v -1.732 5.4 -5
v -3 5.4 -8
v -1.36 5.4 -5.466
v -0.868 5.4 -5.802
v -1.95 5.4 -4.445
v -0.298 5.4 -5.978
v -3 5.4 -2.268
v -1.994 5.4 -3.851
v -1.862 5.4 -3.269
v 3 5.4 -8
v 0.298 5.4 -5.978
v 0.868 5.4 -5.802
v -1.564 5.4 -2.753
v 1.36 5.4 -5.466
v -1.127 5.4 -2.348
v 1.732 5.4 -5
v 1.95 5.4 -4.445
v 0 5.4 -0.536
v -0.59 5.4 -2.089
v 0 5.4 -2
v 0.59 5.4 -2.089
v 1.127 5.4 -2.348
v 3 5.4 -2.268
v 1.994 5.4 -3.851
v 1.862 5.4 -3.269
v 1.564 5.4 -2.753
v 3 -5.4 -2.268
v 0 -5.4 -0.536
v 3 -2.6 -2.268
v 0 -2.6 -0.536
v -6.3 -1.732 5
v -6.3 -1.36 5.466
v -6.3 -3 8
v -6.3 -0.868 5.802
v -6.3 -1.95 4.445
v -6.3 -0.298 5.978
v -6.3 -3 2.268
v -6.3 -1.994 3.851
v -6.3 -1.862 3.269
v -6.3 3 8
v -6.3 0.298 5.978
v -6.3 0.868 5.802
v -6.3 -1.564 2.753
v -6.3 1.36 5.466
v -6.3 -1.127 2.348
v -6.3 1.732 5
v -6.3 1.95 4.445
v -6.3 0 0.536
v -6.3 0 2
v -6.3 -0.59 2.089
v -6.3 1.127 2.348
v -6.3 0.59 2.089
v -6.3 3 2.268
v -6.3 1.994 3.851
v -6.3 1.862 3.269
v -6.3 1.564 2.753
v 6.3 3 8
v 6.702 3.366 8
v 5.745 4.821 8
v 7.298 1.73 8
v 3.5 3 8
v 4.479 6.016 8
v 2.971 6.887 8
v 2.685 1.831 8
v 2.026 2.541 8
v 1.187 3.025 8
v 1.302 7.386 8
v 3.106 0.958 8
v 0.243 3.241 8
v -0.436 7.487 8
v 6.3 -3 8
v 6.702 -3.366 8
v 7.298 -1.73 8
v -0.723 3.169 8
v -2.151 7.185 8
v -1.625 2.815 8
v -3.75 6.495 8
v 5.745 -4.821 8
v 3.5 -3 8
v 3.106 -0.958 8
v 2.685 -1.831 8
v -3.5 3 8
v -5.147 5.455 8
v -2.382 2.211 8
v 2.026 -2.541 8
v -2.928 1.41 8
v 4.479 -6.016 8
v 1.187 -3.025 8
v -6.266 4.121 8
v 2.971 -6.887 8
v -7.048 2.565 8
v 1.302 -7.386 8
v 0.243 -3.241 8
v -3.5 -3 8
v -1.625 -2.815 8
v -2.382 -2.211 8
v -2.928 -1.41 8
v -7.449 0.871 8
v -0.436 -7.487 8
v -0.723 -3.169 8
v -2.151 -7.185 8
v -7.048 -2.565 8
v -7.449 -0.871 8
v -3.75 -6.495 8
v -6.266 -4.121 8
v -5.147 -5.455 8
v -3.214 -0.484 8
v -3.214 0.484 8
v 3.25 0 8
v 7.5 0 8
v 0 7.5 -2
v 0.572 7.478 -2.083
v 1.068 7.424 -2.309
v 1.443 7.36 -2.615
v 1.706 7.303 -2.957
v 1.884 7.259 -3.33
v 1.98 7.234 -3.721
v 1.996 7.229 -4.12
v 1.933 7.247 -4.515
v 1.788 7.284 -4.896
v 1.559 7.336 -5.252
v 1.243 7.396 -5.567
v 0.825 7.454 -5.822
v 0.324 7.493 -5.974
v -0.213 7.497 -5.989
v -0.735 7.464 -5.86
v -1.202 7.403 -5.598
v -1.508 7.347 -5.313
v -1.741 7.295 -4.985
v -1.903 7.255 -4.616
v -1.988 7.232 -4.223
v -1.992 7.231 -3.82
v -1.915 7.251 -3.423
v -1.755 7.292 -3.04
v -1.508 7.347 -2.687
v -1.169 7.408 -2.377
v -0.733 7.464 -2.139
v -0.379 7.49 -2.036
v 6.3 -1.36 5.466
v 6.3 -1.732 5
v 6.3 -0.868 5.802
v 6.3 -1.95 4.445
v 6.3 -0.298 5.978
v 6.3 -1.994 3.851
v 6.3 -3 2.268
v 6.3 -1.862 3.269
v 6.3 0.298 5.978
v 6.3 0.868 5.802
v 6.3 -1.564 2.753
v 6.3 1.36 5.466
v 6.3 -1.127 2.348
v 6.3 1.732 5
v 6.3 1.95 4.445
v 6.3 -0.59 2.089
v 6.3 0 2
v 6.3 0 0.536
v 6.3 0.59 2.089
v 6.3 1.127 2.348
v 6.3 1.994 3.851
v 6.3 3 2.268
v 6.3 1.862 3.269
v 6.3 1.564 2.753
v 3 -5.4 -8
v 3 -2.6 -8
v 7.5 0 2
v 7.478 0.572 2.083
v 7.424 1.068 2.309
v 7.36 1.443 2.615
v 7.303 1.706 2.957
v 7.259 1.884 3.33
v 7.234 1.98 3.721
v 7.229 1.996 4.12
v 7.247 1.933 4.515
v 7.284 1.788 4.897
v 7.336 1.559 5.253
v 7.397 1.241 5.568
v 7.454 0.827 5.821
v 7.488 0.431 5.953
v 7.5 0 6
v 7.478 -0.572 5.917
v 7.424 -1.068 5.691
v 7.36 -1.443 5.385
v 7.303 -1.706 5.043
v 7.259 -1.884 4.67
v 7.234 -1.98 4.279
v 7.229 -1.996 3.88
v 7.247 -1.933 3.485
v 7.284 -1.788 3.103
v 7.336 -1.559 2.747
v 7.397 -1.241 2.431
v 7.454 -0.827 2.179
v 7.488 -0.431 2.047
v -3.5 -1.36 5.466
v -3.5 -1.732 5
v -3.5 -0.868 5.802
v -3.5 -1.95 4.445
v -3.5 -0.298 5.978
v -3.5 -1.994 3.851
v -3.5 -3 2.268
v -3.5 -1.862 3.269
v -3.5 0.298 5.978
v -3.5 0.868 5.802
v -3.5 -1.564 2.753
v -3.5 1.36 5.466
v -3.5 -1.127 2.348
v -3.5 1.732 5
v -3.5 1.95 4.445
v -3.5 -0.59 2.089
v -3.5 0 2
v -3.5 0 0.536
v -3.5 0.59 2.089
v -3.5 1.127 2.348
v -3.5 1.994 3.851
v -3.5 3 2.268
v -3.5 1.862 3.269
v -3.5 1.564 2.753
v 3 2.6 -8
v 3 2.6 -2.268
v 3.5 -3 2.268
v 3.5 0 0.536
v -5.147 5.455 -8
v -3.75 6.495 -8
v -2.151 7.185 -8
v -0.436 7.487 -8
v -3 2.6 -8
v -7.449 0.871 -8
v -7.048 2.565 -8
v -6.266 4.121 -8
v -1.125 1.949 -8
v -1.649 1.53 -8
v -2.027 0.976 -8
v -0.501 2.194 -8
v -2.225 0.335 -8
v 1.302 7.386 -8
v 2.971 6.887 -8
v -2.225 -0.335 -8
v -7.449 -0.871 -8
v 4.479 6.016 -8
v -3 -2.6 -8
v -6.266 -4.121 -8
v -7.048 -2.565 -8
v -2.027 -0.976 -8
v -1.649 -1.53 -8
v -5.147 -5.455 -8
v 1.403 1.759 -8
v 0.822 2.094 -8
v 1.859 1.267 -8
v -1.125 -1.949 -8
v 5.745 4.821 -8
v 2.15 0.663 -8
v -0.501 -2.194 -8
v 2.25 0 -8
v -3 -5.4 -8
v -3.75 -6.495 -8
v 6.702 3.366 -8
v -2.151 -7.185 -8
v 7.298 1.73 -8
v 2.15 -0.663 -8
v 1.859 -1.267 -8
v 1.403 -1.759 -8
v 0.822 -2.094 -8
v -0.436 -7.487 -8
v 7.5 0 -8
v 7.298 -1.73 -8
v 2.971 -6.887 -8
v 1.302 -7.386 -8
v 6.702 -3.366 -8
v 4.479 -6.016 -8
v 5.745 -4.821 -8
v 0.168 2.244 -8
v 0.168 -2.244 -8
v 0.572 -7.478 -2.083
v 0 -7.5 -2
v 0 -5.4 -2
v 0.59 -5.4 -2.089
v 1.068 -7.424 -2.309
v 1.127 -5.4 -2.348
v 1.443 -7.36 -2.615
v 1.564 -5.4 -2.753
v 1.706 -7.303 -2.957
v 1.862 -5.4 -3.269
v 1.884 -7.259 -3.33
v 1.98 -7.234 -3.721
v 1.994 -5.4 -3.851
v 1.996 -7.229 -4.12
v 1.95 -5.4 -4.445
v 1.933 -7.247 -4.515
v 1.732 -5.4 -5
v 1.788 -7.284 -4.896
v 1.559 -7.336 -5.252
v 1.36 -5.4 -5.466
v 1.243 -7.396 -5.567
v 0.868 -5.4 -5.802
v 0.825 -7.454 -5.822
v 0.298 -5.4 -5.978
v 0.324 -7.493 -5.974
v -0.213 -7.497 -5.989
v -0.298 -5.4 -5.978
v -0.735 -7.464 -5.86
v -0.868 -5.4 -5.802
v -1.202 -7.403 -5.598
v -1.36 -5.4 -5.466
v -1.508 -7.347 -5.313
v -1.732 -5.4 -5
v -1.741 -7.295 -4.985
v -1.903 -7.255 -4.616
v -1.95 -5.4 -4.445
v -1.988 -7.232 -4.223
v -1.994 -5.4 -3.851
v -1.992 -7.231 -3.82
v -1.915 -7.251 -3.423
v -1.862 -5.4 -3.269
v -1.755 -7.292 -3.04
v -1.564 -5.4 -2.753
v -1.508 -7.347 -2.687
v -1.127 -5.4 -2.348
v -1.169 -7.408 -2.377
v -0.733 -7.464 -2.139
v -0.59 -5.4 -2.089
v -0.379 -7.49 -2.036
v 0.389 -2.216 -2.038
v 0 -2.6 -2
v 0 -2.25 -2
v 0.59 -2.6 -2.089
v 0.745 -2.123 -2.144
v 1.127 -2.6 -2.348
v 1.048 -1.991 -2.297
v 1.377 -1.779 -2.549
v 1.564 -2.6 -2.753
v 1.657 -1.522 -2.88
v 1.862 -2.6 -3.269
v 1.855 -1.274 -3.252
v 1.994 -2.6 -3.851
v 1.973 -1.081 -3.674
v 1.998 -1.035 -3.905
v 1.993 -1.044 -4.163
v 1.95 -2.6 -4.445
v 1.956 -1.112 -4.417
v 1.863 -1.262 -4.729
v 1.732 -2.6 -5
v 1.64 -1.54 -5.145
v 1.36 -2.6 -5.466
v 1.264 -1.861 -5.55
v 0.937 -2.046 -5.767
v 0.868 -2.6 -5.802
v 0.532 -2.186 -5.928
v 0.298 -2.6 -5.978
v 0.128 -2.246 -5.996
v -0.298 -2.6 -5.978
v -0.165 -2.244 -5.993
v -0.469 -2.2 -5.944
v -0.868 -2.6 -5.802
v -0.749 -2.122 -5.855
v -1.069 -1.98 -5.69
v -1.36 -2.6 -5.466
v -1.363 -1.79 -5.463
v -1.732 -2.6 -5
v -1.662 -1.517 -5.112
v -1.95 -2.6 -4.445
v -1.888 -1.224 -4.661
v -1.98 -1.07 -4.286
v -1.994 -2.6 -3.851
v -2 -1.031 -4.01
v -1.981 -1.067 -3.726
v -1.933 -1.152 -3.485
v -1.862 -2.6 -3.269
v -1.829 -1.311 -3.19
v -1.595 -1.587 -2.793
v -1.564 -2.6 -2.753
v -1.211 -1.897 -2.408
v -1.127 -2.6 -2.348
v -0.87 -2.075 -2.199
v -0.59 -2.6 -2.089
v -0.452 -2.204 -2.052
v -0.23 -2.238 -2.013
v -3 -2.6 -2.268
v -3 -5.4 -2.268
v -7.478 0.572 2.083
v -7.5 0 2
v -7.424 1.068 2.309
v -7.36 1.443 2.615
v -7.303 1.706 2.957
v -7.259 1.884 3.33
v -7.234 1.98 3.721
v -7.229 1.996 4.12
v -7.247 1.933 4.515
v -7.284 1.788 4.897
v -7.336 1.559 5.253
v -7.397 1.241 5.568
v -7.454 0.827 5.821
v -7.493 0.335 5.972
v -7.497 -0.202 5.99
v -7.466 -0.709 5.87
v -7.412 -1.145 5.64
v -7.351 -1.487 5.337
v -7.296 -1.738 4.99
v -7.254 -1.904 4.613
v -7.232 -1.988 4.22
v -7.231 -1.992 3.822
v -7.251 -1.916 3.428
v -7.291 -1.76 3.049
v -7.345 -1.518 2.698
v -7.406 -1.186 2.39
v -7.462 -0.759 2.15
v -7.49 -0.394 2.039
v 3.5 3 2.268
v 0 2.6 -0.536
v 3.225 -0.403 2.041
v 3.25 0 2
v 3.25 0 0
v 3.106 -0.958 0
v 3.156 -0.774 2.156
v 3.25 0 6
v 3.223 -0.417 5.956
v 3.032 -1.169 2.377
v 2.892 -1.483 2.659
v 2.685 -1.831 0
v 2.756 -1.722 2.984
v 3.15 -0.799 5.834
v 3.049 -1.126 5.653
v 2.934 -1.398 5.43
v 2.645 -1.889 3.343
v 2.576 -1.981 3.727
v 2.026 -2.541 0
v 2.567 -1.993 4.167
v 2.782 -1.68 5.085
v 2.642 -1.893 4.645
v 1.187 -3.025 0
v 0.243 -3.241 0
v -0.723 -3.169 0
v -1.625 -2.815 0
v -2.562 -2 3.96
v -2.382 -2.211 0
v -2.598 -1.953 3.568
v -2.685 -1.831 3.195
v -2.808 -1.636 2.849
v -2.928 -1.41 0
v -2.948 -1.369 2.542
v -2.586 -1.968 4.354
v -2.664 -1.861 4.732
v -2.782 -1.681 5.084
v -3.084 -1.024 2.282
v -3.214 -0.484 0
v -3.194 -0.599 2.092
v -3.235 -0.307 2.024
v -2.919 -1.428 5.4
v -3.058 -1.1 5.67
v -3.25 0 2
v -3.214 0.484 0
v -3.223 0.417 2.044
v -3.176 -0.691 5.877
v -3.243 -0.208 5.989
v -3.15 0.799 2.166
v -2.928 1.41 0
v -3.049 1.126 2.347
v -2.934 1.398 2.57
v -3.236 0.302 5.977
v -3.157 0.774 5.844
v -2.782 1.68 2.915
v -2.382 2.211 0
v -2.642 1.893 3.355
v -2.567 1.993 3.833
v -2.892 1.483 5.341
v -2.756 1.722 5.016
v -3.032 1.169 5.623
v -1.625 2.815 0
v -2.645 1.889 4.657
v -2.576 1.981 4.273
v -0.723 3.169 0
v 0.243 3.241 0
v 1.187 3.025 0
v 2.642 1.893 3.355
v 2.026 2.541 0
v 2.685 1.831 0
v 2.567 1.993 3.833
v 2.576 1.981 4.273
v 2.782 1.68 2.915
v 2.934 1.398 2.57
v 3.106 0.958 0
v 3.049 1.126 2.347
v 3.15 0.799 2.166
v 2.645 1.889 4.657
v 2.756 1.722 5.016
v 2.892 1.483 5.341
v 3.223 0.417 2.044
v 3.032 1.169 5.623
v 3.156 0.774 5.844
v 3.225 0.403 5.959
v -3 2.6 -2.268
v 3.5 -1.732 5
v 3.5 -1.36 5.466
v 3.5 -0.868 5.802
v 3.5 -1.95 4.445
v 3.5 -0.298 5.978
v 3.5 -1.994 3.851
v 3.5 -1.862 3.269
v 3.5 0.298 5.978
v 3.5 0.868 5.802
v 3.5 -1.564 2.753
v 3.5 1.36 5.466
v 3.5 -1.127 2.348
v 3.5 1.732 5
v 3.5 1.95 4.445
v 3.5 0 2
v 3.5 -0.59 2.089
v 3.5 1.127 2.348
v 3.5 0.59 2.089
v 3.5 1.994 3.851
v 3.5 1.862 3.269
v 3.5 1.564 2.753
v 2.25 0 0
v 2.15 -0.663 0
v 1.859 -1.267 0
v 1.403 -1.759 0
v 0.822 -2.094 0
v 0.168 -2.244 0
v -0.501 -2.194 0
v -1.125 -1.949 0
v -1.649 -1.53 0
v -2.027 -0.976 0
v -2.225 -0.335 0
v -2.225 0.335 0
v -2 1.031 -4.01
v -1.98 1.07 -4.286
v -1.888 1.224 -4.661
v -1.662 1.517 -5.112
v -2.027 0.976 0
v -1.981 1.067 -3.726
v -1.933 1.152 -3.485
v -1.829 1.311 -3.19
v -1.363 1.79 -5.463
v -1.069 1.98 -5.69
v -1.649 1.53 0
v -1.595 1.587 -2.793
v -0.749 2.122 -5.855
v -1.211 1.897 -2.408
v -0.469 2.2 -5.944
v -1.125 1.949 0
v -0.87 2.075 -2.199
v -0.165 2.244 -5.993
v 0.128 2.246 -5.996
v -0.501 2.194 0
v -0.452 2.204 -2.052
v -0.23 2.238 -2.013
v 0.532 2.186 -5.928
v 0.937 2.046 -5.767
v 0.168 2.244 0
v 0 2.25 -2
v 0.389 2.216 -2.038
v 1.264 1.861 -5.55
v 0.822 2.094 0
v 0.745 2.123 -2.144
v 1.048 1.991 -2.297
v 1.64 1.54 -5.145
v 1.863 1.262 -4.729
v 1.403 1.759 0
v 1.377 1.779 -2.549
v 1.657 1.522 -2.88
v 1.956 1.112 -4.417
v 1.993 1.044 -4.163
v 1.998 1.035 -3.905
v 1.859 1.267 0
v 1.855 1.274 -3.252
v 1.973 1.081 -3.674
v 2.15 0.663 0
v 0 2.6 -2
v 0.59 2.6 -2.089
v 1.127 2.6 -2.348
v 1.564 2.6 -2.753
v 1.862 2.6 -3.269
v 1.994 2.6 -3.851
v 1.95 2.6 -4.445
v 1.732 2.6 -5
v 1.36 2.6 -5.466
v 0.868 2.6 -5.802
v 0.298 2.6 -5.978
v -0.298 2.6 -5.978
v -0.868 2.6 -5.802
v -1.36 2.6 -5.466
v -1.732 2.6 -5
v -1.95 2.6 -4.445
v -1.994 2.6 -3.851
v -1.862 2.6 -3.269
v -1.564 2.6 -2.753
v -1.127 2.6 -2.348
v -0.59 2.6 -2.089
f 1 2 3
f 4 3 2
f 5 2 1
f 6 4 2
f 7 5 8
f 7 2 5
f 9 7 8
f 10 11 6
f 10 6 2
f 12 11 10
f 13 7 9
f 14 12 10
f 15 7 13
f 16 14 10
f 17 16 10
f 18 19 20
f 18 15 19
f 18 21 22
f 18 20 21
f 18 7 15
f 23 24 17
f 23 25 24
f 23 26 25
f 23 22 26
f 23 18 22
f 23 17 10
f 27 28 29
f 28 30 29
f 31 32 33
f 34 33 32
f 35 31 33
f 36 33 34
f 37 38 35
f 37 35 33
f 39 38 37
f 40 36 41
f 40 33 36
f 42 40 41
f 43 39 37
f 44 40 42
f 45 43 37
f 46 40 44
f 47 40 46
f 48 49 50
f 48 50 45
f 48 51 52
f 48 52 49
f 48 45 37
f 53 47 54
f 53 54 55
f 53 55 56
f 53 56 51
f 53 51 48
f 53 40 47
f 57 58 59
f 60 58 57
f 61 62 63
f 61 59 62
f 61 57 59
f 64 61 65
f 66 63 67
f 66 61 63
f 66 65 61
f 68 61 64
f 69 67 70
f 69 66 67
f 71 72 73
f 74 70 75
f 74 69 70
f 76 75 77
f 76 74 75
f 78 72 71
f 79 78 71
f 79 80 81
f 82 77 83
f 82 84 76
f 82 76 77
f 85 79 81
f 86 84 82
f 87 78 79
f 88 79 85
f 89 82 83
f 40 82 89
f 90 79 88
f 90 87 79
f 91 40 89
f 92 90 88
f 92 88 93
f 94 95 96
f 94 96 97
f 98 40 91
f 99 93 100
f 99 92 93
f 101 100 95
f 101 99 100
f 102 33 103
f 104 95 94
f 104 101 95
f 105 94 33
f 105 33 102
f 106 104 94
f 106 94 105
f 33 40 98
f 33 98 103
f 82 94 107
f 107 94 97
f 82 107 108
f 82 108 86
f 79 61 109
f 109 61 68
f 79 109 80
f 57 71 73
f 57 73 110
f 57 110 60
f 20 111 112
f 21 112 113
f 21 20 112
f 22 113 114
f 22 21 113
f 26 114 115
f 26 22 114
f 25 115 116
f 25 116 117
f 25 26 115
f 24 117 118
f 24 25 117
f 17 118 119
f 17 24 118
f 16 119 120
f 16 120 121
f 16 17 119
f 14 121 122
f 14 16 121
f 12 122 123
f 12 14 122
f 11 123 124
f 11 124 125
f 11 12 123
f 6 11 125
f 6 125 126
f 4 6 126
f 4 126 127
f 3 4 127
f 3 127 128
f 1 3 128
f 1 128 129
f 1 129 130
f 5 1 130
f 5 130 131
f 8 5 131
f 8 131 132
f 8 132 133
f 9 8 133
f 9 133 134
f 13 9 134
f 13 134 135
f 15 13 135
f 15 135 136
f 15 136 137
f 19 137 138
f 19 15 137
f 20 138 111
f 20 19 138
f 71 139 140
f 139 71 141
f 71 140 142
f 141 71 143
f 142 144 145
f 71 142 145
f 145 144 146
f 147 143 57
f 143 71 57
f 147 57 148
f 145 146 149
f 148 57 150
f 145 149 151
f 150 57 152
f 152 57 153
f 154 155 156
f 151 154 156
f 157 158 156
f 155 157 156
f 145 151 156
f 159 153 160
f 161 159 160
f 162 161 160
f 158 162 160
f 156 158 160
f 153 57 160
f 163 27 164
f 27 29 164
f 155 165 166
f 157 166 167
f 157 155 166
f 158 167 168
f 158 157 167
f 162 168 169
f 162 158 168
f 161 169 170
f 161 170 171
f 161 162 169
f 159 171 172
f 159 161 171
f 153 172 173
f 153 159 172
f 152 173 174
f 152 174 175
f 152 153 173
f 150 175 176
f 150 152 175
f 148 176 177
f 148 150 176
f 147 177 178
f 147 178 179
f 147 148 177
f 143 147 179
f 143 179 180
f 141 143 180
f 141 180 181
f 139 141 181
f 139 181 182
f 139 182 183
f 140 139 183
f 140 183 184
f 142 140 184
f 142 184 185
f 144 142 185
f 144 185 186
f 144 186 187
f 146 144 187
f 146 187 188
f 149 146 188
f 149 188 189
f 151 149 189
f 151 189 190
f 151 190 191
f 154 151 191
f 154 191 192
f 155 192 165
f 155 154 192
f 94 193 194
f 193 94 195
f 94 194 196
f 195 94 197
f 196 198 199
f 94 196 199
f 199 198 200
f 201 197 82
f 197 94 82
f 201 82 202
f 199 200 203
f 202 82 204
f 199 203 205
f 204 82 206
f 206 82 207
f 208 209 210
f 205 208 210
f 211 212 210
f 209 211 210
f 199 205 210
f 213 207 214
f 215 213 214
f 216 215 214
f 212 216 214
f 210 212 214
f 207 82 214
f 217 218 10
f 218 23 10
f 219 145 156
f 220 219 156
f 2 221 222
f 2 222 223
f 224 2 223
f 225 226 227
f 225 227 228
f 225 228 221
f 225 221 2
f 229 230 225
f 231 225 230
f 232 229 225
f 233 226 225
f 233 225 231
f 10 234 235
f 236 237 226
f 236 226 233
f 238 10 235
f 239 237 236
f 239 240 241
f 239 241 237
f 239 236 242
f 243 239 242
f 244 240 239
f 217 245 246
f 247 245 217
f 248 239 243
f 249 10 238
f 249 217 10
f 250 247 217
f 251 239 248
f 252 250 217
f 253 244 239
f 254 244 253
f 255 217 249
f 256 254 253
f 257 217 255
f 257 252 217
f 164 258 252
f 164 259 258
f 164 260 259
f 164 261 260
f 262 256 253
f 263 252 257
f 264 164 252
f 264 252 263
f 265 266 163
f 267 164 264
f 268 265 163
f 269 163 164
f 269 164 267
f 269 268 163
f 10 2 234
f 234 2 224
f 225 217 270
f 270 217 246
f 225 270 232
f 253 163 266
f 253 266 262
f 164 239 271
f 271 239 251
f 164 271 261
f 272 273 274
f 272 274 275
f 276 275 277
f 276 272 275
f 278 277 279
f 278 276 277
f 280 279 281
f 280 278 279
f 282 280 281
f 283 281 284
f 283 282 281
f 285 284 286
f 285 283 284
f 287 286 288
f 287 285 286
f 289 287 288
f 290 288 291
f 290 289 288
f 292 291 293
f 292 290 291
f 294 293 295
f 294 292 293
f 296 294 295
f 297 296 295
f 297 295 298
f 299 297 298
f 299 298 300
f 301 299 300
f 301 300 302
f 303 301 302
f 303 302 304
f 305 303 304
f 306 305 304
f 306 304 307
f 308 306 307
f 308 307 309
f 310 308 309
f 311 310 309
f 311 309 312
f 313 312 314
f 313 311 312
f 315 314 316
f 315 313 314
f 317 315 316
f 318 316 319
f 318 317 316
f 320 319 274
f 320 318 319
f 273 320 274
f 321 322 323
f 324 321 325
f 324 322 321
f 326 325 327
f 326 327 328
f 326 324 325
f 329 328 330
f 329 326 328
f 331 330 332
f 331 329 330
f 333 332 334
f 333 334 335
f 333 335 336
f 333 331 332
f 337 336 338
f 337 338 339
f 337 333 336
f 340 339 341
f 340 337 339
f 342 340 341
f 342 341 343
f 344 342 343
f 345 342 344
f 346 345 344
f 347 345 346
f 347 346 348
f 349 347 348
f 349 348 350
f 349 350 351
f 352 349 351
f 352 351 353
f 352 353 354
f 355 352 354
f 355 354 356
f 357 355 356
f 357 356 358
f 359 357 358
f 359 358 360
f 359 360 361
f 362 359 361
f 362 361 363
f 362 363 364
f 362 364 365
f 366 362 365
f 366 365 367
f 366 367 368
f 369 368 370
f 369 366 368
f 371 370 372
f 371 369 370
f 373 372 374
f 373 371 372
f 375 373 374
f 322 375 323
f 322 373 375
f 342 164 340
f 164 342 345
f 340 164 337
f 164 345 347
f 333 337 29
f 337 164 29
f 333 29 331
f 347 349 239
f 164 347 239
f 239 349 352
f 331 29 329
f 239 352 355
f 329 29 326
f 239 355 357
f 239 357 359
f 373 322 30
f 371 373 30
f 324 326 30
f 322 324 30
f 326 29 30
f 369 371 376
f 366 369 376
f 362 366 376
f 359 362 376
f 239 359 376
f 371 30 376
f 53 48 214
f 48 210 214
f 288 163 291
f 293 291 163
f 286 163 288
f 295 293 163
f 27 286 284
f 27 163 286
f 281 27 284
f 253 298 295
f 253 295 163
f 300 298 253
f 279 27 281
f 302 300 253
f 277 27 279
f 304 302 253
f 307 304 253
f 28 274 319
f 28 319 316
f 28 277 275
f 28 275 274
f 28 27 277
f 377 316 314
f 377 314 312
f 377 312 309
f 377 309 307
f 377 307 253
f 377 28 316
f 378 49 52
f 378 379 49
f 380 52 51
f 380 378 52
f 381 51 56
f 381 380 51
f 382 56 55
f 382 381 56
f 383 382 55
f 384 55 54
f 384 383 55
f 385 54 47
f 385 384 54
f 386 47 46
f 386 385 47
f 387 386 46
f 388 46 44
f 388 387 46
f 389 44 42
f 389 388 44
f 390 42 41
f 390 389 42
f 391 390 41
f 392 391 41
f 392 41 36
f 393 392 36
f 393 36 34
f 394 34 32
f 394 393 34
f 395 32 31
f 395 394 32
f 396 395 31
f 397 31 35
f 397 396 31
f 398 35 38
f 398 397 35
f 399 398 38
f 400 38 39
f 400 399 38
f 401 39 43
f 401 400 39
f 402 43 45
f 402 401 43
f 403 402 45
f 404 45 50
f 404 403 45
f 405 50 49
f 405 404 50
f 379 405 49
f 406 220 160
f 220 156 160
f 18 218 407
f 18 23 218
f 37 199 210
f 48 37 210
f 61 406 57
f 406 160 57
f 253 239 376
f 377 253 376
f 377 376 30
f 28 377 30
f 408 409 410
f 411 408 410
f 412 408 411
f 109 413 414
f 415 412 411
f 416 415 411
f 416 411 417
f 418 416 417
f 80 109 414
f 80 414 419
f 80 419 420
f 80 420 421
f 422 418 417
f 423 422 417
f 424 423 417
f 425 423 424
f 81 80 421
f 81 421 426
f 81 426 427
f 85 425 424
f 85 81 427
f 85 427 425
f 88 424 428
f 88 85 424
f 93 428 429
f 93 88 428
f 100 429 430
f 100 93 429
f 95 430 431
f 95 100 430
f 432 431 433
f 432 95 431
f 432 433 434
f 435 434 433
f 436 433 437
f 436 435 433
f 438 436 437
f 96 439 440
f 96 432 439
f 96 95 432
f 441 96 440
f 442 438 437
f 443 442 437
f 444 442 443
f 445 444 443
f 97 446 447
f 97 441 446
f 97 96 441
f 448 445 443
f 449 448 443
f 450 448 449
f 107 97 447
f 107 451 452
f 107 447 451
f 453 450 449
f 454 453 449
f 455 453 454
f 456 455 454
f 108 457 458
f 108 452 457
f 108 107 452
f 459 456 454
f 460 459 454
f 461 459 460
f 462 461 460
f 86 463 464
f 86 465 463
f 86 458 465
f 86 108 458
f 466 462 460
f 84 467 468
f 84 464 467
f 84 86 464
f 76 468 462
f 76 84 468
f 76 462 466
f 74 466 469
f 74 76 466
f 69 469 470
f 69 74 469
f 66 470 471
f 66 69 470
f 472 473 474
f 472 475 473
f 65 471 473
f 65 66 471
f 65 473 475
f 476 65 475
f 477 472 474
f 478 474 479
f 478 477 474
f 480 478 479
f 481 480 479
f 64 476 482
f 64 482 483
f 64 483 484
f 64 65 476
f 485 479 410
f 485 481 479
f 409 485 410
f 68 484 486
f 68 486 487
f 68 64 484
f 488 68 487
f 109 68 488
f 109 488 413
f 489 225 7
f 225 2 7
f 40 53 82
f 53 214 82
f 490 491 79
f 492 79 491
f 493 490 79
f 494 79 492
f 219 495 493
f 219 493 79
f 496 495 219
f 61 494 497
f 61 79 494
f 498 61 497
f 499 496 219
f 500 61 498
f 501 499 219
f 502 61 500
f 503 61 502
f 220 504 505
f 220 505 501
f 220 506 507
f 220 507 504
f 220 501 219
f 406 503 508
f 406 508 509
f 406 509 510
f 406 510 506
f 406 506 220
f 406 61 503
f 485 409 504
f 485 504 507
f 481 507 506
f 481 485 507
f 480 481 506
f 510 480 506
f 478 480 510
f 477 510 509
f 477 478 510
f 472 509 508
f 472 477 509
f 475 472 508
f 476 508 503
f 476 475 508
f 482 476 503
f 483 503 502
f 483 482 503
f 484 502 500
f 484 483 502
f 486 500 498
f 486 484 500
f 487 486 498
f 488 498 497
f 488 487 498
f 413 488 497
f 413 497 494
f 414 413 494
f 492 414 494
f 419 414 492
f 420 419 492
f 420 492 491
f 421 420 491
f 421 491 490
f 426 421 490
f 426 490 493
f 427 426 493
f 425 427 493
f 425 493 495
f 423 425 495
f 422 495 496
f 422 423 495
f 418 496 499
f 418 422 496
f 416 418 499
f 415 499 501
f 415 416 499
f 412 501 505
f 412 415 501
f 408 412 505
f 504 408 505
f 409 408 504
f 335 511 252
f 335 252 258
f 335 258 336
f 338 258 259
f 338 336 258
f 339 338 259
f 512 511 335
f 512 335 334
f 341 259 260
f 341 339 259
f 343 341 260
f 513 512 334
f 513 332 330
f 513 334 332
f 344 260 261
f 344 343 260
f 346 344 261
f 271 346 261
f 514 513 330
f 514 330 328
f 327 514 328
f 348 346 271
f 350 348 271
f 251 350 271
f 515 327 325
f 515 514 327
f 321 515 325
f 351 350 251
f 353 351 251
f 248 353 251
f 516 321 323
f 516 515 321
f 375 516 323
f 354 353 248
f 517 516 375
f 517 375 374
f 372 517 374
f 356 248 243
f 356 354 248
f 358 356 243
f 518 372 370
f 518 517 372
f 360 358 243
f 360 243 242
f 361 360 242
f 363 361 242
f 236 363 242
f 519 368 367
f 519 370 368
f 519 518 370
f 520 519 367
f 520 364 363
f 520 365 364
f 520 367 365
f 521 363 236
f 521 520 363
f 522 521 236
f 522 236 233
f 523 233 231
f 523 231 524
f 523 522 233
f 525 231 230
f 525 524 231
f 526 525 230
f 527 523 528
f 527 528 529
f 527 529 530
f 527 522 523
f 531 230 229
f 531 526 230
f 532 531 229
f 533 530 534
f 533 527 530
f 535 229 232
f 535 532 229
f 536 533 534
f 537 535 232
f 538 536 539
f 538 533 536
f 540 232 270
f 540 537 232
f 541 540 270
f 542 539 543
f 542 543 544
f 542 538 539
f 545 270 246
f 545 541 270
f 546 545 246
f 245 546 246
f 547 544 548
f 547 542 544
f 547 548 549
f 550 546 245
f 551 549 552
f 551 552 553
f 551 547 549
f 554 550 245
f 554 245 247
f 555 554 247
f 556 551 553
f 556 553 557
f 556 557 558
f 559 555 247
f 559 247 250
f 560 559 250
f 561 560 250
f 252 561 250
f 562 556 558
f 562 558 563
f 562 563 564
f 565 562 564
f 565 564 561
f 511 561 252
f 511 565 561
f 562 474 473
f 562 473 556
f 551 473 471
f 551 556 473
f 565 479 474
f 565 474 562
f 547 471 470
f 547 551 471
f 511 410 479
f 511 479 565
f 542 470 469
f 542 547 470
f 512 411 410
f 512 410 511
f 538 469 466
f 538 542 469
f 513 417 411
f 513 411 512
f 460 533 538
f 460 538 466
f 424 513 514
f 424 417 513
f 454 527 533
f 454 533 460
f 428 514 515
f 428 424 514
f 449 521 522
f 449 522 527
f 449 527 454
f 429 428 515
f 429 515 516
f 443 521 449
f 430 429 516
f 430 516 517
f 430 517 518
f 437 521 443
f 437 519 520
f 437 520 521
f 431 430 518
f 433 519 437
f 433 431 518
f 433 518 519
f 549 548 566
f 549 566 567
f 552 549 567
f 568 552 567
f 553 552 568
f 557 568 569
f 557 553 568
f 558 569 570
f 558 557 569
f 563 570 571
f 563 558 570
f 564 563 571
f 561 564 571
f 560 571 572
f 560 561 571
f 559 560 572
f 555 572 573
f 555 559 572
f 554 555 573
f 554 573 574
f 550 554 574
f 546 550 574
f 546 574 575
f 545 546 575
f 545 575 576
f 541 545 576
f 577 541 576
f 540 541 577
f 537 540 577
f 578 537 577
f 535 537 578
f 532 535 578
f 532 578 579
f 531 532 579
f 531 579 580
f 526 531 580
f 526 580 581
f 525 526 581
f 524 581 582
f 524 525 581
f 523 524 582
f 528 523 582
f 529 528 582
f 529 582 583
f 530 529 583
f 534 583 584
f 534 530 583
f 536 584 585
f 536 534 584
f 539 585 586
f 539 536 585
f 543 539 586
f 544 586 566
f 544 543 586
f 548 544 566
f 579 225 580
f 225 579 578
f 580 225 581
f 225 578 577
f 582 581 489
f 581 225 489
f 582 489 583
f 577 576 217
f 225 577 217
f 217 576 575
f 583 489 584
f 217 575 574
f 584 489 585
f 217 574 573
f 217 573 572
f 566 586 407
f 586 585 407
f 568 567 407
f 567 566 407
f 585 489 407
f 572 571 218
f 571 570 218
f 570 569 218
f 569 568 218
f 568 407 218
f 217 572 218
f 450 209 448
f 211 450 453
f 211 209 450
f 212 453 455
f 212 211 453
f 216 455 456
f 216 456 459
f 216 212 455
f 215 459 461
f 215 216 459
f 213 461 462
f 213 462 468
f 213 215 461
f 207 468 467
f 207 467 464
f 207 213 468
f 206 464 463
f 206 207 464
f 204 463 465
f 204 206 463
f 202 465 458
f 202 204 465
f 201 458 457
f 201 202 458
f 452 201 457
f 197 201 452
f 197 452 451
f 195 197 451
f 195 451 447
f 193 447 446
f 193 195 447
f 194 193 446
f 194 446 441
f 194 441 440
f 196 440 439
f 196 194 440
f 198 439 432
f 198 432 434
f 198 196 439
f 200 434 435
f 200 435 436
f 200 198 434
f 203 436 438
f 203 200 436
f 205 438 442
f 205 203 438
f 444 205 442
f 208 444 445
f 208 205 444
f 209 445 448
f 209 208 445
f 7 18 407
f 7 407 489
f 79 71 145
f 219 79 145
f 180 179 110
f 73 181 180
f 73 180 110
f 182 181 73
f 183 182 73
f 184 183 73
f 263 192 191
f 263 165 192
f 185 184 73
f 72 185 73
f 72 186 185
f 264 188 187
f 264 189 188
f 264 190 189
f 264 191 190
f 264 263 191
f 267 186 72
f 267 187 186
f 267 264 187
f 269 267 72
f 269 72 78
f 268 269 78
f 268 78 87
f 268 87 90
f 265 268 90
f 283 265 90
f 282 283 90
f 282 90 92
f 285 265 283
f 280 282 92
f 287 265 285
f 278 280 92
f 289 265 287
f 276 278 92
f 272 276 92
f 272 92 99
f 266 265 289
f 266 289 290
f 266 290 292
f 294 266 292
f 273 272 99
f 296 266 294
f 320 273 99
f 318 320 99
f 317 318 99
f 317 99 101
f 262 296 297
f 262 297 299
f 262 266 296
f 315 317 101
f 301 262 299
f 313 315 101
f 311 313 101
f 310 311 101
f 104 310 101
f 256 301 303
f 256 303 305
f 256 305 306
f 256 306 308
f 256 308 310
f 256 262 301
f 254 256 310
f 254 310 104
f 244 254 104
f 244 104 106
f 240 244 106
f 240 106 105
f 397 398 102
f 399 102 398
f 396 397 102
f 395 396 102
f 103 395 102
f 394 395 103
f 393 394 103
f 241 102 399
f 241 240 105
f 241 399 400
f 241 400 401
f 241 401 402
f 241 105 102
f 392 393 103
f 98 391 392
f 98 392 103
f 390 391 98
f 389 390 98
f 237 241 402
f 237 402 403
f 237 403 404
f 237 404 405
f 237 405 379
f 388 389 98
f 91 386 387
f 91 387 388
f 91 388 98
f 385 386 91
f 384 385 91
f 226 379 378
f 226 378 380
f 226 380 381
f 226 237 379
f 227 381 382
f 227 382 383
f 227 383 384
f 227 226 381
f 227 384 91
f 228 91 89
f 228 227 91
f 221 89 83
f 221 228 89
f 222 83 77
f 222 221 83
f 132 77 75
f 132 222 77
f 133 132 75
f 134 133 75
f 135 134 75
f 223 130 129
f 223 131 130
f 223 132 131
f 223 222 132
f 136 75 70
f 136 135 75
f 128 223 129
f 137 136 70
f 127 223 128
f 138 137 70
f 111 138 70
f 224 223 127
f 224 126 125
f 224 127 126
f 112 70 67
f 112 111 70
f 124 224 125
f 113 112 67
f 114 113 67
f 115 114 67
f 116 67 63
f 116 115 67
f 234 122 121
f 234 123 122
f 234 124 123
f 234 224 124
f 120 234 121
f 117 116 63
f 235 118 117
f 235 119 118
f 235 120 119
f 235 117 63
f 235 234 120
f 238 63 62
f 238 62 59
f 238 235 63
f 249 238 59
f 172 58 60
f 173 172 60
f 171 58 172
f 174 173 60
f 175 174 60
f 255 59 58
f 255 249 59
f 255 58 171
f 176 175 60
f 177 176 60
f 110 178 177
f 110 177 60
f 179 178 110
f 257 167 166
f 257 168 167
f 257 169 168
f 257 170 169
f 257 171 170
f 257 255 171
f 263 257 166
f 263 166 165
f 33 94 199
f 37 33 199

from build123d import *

# Parameters (mm, degrees)
CUT_EXTRUDE1_DEPTH      = 14.285330256
CUT_EXTRUDE1_DEPTH_BACK = 14.285330256
SKETCH4_R               = 2
CUT_EXTRUDE2_DEPTH      = 14.285330429
CUT_EXTRUDE2_DEPTH_BACK = 14.285330429
SKETCH5_R               = 2
CUT_EXTRUDE3_DEPTH      = 1.4
CUT_EXTRUDE4_DEPTH      = 1.4
CUT_EXTRUDE5_DEPTH      = 1.4
CUT_EXTRUDE6_DEPTH      = 1.4


with BuildPart() as part:
    # Sketch2 → Revolve1 (revolve)
    with BuildSketch(Plane(origin=(0, 0, 0), x_dir=(0, 0, -1), z_dir=(1, 0, 0)), mode=Mode.PRIVATE) as revolve1_sk:
        Polygon((8, 2.25), (0, 2.25), (0, 3.25), (-8, 3.25), (-8, 7.5), (8, 7.5), align=None)
    revolve(revolve1_sk.sketch.rotate(Axis((0, 0, 33.32637001), (0, 0, -1)), 90), axis=Axis((0, 0, 33.32637001), (0, 0, -1)))

    # Sketch4 → Cut-Extrude1 (cut, two sides: drawn at the far end of the back side and taken through both)
    with BuildSketch(Plane(origin=(0, 0, 0), x_dir=(1, 0, 0), z_dir=(0, 1, 0)).offset(-CUT_EXTRUDE1_DEPTH_BACK)):
        with Locations(Location((0, 4, 0), (0, 0, 270))):
            Circle(SKETCH4_R)
    extrude(amount=CUT_EXTRUDE1_DEPTH + CUT_EXTRUDE1_DEPTH_BACK, mode=Mode.SUBTRACT)

    # Sketch5 → Cut-Extrude2 (cut, two sides: drawn at the far end of the back side and taken through both)
    with BuildSketch(Plane(origin=(0, 0, 0), x_dir=(0, 0, -1), z_dir=(1, 0, 0)).offset(-CUT_EXTRUDE2_DEPTH_BACK)):
        with Locations((-4, 0)):
            Circle(SKETCH5_R)
    extrude(amount=CUT_EXTRUDE2_DEPTH + CUT_EXTRUDE2_DEPTH_BACK, mode=Mode.SUBTRACT)

    # Sketch6 → Cut-Extrude3 (cut, symmetric)
    with BuildSketch(Plane(origin=(4.9, 0, 0), x_dir=(0, 0, -1), z_dir=(1, 0, 0))):
        Polygon((-5.732050808, 3), (-8, 3), (-8, -3), (-5.732050808, -3), (-2.267949192, -3), (-0.535898385, 0), (-2.267949192, 3), align=None)
    extrude(amount=CUT_EXTRUDE3_DEPTH, both=True, mode=Mode.SUBTRACT)

    # Sketch7 → Cut-Extrude4 (cut, symmetric)
    with BuildSketch(Plane(origin=(-4.9, 0, 0), x_dir=(0, 0, -1), z_dir=(1, 0, 0))):
        Polygon((-5.732050808, 3), (-8, 3), (-8, -3), (-5.732050808, -3), (-2.267949192, -3), (-0.535898385, 0), (-2.267949192, 3), align=None)
    extrude(amount=CUT_EXTRUDE4_DEPTH, both=True, mode=Mode.SUBTRACT)

    # Sketch8 → Cut-Extrude5 (cut, symmetric)
    with BuildSketch(Plane(origin=(0, 4, 0), x_dir=(-1, 0, 0), z_dir=(0, 1, 0))):
        Polygon((3, -5.732050808), (3, -8), (-3, -8), (-3, -5.732050808), (-3, -2.267949192), (0, -0.535898385), (3, -2.267949192), align=None)
    extrude(amount=CUT_EXTRUDE5_DEPTH, both=True, mode=Mode.SUBTRACT)

    # Sketch9 → Cut-Extrude6 (cut, symmetric)
    with BuildSketch(Plane(origin=(0, -4, 0), x_dir=(-1, 0, 0), z_dir=(0, 1, 0))):
        Polygon((-3, -5.732050808), (-3, -8), (3, -8), (3, -5.732050808), (3, -2.267949192), (0, -0.535898385), (-3, -2.267949192), align=None)
    extrude(amount=CUT_EXTRUDE6_DEPTH, both=True, mode=Mode.SUBTRACT)


solid = part.part
